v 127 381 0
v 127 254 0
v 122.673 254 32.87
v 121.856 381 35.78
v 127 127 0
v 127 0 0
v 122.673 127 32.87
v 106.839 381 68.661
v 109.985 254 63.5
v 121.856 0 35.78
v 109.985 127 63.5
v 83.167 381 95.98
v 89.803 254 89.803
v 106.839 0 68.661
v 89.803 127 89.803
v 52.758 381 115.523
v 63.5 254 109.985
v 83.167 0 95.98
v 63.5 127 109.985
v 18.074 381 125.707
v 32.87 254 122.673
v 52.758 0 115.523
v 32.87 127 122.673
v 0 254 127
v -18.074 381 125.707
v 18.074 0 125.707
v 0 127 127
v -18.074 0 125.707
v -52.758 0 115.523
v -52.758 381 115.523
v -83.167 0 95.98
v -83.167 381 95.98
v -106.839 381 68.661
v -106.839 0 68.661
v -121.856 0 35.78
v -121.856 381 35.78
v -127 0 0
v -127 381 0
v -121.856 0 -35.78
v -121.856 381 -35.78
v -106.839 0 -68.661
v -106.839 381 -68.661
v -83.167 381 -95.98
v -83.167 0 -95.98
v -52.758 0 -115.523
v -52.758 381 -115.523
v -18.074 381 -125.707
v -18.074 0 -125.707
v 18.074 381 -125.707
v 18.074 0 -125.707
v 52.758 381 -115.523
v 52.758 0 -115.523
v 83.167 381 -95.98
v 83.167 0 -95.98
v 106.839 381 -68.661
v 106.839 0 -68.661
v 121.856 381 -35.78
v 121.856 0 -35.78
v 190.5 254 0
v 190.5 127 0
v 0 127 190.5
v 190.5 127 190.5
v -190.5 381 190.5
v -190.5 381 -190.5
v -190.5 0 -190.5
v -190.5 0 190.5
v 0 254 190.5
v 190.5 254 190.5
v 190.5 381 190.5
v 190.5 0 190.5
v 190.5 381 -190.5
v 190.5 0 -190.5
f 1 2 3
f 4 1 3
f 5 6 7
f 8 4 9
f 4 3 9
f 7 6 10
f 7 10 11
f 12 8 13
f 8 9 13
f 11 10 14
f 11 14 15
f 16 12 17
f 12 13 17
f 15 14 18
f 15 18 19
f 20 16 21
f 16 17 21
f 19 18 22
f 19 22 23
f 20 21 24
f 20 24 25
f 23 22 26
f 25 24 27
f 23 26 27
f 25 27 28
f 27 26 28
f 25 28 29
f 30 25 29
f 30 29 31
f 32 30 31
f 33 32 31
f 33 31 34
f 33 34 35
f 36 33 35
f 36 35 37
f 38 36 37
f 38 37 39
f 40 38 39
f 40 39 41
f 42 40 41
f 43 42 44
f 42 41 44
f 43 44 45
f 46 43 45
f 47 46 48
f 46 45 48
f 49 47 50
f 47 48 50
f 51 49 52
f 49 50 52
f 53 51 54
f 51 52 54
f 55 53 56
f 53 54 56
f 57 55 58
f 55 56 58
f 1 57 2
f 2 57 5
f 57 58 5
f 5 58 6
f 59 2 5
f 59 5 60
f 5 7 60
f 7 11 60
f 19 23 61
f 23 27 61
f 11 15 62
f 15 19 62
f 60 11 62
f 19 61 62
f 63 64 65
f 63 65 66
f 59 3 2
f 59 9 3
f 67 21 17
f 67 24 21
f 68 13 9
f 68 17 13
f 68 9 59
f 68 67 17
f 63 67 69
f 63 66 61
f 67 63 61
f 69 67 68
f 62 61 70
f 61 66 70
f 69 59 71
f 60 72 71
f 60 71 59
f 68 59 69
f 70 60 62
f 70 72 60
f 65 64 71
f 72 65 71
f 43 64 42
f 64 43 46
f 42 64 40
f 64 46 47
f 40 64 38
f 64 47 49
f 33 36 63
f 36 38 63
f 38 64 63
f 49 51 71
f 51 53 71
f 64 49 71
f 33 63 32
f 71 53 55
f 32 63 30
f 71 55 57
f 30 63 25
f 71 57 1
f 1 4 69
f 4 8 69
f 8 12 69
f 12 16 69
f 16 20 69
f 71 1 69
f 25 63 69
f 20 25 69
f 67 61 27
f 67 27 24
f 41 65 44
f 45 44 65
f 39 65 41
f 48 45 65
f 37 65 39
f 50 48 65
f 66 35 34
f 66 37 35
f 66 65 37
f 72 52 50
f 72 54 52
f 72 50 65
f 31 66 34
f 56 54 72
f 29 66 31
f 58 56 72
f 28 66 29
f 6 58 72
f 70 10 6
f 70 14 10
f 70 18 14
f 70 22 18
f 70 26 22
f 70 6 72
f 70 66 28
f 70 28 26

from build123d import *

# Parameters (mm, degrees)
F1_W     = 381
F1_H     = 381
F1_R     = 127
F2_DEPTH = 381
F3_W     = 190.5
F3_H     = 127
F4_DEPTH = 190.5


with BuildPart() as f2:
    # F1 (on face) → F2 (new body)
    with BuildSketch(Plane.XZ):
        Rectangle(F1_W, F1_H)
        Circle(F1_R, mode=Mode.SUBTRACT)
    extrude(amount=-F2_DEPTH)

    # F3 (on face) → F4 (cut)
    with BuildSketch(Plane.XY.offset(190.5)):
        with Locations((95.25, 190.5)):
            Rectangle(F3_W, F3_H)
    extrude(amount=-F4_DEPTH, mode=Mode.SUBTRACT)


solid = f2.part
